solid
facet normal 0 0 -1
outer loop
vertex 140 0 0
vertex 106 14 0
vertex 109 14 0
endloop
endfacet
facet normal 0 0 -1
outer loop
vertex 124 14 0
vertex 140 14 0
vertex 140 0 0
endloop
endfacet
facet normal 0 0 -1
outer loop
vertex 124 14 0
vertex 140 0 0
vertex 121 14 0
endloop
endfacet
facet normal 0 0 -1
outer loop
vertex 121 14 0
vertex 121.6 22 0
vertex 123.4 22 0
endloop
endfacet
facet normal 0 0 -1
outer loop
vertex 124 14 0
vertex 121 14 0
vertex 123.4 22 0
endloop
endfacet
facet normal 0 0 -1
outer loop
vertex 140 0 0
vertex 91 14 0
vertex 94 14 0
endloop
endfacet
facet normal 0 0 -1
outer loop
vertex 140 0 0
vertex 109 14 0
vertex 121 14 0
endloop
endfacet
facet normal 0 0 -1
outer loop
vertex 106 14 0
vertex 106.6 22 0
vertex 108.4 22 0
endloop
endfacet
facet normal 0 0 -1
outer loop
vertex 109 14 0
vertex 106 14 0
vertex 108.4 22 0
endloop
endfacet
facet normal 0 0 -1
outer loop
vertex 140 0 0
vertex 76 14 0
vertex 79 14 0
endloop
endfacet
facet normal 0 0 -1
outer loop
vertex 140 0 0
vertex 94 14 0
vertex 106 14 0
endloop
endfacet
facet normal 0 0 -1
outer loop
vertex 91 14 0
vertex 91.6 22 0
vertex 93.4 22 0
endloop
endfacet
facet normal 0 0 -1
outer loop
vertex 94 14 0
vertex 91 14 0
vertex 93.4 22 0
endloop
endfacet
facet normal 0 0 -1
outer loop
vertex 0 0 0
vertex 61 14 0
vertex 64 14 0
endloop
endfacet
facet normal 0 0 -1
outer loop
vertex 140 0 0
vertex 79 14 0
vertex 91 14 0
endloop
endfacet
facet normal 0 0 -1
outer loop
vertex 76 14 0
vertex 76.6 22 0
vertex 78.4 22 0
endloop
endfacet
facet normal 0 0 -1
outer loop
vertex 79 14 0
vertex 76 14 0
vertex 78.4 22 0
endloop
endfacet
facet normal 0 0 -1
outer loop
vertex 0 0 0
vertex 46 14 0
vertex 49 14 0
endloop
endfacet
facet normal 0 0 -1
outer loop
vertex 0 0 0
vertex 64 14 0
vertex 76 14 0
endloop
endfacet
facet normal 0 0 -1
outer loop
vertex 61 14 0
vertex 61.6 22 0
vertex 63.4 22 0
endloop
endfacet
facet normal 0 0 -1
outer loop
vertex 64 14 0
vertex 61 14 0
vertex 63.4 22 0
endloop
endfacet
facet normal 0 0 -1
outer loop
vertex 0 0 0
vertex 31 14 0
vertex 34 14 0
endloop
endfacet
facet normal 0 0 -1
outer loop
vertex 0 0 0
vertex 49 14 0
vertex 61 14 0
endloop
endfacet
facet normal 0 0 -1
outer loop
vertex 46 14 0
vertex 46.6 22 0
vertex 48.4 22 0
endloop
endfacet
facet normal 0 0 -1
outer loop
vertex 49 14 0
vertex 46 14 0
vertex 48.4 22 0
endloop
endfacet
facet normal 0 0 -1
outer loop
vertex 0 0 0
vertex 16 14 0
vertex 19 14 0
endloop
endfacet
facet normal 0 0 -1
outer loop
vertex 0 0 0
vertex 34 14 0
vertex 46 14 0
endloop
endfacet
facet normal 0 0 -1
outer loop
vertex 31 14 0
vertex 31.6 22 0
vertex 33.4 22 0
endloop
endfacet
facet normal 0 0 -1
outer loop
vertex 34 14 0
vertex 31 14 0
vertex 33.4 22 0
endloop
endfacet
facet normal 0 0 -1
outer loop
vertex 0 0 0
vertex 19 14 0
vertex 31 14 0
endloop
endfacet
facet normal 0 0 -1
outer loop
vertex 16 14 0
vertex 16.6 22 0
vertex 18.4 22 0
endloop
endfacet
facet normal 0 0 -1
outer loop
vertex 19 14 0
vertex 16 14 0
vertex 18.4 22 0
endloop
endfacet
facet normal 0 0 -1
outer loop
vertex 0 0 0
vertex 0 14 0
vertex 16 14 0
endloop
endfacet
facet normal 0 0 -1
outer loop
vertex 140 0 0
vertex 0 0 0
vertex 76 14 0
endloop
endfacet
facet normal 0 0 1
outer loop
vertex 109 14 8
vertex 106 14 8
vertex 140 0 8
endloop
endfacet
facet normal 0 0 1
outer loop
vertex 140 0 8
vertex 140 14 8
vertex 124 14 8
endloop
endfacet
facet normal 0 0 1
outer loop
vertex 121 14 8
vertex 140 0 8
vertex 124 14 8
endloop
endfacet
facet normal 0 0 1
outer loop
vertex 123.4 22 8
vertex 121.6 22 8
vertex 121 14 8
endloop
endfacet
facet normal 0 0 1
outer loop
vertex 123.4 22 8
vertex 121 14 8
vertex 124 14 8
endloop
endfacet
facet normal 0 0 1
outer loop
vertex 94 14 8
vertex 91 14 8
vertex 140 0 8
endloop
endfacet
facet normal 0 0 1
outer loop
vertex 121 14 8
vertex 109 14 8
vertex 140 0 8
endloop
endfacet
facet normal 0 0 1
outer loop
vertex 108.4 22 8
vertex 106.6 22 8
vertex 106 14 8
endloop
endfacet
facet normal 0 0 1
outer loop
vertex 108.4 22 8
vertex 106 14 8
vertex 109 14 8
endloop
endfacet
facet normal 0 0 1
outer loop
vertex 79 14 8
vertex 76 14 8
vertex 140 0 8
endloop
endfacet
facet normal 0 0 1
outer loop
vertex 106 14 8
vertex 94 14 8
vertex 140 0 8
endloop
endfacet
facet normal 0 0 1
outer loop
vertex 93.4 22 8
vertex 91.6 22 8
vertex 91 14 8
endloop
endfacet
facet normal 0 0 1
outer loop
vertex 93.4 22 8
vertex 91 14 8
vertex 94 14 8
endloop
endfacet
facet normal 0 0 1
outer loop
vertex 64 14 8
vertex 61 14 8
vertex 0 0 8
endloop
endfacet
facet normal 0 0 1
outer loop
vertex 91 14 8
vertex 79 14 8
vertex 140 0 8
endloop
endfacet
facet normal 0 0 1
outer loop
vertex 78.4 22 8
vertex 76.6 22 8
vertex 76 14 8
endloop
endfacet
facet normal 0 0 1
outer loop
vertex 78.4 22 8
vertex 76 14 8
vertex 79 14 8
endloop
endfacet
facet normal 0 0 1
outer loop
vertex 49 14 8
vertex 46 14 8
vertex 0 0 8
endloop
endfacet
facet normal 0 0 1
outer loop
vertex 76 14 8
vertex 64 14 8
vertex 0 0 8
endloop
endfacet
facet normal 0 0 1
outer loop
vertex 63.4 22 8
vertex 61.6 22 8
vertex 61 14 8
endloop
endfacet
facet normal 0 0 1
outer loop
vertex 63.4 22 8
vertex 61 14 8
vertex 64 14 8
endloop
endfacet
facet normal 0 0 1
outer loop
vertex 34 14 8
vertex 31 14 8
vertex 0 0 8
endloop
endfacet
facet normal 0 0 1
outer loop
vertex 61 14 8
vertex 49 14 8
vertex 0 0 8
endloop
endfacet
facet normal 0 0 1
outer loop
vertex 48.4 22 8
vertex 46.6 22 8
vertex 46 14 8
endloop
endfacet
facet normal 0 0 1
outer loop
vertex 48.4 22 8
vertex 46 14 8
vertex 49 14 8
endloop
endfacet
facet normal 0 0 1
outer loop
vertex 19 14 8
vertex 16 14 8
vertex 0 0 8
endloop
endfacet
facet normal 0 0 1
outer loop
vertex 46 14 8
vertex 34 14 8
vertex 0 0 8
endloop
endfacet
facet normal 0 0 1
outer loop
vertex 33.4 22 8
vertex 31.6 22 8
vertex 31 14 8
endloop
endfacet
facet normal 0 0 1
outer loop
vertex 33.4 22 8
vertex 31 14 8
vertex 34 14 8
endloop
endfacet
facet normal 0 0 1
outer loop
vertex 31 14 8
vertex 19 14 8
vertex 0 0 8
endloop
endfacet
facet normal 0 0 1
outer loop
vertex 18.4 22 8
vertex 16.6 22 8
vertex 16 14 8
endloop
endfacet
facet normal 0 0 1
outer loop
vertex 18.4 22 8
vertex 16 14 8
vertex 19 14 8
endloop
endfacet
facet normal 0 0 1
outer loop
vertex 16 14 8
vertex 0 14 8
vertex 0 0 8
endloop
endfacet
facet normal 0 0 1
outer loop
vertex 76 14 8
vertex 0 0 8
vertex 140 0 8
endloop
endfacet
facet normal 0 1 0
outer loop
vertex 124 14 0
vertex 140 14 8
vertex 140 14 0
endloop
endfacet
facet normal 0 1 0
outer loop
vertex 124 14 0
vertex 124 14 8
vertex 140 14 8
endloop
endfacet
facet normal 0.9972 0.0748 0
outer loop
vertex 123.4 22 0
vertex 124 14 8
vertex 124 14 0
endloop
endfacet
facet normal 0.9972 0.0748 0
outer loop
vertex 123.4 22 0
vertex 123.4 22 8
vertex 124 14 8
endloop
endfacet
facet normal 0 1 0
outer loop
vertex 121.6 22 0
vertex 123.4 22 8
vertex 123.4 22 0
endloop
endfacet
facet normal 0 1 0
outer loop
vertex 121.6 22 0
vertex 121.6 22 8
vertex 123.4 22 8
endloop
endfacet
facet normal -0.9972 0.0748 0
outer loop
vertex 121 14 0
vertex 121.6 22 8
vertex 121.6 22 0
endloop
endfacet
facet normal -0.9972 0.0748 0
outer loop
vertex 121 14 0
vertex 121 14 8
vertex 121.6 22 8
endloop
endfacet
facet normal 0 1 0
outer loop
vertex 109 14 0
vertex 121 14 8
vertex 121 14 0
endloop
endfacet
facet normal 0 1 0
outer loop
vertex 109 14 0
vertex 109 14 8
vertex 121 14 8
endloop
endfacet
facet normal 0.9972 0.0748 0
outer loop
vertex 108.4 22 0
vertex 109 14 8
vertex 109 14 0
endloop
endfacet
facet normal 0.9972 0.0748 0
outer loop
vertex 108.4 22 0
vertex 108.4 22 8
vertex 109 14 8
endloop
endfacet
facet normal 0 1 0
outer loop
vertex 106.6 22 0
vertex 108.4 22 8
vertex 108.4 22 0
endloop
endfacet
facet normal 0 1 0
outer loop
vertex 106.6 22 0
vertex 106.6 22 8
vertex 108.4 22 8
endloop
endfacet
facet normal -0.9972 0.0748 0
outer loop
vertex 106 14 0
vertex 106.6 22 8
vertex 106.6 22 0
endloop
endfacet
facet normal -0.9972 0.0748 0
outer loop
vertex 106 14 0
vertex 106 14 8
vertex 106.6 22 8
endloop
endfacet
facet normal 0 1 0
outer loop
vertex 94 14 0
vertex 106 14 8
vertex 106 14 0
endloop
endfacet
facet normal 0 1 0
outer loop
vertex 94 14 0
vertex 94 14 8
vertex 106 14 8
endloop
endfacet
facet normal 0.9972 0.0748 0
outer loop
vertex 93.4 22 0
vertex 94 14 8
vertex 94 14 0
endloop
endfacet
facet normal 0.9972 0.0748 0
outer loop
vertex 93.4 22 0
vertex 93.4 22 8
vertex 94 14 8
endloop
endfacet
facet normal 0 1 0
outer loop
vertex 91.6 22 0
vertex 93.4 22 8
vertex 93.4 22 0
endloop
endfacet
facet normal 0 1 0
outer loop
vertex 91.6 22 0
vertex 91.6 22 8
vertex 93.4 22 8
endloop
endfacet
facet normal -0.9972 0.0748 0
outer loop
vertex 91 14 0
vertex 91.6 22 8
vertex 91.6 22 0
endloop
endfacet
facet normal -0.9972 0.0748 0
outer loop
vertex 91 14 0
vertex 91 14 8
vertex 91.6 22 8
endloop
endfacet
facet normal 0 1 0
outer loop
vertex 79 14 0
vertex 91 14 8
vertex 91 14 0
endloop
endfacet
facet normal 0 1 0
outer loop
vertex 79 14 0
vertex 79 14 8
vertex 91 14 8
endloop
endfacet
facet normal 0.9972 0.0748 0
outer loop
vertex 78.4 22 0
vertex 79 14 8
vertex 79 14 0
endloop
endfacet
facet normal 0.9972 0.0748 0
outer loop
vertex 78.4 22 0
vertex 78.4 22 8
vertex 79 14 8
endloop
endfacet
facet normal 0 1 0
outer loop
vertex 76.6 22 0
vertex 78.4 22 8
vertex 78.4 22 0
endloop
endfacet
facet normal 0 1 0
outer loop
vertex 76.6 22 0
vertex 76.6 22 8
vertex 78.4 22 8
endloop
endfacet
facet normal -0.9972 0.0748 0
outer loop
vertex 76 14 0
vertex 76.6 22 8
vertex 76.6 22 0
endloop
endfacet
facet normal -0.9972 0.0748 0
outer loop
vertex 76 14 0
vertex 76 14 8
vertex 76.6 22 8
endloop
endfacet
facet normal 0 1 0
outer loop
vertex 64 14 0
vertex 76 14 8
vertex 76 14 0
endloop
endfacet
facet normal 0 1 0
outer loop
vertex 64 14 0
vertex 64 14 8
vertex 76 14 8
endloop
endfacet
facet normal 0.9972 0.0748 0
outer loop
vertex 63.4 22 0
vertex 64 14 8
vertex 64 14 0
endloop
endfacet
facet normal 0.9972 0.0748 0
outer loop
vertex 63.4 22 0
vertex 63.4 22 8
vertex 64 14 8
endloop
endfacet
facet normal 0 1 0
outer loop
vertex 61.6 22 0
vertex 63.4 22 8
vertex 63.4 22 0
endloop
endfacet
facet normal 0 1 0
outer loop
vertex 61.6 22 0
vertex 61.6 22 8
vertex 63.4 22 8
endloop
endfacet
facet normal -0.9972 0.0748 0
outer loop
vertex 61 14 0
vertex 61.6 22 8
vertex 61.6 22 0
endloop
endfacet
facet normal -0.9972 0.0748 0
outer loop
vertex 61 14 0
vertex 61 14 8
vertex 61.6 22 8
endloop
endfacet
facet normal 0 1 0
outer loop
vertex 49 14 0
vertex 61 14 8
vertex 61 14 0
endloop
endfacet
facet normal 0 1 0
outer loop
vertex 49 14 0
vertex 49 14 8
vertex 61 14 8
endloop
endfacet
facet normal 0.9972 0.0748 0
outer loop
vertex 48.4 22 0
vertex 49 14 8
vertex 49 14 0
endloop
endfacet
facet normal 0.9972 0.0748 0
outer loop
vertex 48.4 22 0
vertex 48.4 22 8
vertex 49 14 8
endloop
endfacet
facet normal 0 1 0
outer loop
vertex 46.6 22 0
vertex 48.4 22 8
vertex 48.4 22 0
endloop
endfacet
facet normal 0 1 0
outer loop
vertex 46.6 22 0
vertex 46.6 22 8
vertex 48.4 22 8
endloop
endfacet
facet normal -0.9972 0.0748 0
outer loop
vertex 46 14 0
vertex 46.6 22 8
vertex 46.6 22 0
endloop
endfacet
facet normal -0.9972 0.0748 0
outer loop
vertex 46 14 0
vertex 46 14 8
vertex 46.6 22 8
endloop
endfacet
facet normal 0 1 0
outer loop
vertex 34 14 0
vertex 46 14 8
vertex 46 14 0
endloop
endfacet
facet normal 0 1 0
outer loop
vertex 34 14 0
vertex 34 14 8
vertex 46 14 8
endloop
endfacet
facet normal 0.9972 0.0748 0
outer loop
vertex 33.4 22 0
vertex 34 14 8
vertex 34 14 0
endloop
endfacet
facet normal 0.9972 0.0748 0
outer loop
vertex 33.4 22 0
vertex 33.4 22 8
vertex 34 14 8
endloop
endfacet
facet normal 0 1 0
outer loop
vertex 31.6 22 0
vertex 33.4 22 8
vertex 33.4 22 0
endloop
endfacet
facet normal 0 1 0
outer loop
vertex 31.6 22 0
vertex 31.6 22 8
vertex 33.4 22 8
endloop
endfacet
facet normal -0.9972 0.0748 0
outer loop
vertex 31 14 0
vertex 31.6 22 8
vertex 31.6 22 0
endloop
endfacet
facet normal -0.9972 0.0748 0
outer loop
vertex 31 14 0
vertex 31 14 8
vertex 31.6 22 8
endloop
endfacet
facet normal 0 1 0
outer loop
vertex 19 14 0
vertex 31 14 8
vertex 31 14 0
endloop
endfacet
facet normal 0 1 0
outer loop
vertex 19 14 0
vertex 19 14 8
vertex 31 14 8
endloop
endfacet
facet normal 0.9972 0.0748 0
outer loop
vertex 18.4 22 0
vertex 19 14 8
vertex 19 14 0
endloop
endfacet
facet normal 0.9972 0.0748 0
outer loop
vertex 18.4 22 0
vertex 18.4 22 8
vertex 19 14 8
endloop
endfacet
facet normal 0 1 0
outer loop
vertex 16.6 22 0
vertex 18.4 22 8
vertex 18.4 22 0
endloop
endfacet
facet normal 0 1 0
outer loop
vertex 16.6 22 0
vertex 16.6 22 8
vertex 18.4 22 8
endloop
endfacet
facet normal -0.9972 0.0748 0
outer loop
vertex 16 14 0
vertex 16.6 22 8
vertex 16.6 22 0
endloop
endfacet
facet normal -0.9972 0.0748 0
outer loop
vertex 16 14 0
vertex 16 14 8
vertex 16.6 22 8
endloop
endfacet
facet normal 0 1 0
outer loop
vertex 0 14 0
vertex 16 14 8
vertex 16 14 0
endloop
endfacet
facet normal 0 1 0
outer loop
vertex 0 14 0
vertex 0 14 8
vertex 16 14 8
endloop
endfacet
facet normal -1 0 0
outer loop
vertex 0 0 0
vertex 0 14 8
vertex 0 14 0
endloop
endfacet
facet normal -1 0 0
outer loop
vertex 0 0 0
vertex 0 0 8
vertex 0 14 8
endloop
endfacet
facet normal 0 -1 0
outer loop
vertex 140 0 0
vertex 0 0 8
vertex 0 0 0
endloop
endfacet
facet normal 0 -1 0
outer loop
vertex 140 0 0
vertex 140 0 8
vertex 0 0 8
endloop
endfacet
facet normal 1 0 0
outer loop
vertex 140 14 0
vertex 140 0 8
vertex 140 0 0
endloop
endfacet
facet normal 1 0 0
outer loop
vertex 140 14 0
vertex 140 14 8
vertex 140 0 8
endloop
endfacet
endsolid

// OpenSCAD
$fn = 32;

// ----------------------------------------------------------------------
// Gear rack: 8 teeth on a 140 mm bar, pitch 15 mm
// ----------------------------------------------------------------------

// --- parameters (mm) ---
profile_height = 8;       // extrusion height
profile_points = 36;      // points of the closed outline

profile = [[0, 0], [140, 0], [140, 14], [124, 14], [123.4, 22], [121.6, 22], [121, 14], [109, 14], [108.4, 22], [106.6, 22], [106, 14], [94, 14], [93.4, 22], [91.6, 22], [91, 14], [79, 14], [78.4, 22], [76.6, 22], [76, 14], [64, 14], [63.4, 22], [61.6, 22], [61, 14], [49, 14], [48.4, 22], [46.6, 22], [46, 14], [34, 14], [33.4, 22], [31.6, 22], [31, 14], [19, 14], [18.4, 22], [16.6, 22], [16, 14], [0, 14]];  // single closed polygon, 36 points, counter clockwise

// --- the one profile operation ---
linear_extrude(height = profile_height) polygon(points = profile);
